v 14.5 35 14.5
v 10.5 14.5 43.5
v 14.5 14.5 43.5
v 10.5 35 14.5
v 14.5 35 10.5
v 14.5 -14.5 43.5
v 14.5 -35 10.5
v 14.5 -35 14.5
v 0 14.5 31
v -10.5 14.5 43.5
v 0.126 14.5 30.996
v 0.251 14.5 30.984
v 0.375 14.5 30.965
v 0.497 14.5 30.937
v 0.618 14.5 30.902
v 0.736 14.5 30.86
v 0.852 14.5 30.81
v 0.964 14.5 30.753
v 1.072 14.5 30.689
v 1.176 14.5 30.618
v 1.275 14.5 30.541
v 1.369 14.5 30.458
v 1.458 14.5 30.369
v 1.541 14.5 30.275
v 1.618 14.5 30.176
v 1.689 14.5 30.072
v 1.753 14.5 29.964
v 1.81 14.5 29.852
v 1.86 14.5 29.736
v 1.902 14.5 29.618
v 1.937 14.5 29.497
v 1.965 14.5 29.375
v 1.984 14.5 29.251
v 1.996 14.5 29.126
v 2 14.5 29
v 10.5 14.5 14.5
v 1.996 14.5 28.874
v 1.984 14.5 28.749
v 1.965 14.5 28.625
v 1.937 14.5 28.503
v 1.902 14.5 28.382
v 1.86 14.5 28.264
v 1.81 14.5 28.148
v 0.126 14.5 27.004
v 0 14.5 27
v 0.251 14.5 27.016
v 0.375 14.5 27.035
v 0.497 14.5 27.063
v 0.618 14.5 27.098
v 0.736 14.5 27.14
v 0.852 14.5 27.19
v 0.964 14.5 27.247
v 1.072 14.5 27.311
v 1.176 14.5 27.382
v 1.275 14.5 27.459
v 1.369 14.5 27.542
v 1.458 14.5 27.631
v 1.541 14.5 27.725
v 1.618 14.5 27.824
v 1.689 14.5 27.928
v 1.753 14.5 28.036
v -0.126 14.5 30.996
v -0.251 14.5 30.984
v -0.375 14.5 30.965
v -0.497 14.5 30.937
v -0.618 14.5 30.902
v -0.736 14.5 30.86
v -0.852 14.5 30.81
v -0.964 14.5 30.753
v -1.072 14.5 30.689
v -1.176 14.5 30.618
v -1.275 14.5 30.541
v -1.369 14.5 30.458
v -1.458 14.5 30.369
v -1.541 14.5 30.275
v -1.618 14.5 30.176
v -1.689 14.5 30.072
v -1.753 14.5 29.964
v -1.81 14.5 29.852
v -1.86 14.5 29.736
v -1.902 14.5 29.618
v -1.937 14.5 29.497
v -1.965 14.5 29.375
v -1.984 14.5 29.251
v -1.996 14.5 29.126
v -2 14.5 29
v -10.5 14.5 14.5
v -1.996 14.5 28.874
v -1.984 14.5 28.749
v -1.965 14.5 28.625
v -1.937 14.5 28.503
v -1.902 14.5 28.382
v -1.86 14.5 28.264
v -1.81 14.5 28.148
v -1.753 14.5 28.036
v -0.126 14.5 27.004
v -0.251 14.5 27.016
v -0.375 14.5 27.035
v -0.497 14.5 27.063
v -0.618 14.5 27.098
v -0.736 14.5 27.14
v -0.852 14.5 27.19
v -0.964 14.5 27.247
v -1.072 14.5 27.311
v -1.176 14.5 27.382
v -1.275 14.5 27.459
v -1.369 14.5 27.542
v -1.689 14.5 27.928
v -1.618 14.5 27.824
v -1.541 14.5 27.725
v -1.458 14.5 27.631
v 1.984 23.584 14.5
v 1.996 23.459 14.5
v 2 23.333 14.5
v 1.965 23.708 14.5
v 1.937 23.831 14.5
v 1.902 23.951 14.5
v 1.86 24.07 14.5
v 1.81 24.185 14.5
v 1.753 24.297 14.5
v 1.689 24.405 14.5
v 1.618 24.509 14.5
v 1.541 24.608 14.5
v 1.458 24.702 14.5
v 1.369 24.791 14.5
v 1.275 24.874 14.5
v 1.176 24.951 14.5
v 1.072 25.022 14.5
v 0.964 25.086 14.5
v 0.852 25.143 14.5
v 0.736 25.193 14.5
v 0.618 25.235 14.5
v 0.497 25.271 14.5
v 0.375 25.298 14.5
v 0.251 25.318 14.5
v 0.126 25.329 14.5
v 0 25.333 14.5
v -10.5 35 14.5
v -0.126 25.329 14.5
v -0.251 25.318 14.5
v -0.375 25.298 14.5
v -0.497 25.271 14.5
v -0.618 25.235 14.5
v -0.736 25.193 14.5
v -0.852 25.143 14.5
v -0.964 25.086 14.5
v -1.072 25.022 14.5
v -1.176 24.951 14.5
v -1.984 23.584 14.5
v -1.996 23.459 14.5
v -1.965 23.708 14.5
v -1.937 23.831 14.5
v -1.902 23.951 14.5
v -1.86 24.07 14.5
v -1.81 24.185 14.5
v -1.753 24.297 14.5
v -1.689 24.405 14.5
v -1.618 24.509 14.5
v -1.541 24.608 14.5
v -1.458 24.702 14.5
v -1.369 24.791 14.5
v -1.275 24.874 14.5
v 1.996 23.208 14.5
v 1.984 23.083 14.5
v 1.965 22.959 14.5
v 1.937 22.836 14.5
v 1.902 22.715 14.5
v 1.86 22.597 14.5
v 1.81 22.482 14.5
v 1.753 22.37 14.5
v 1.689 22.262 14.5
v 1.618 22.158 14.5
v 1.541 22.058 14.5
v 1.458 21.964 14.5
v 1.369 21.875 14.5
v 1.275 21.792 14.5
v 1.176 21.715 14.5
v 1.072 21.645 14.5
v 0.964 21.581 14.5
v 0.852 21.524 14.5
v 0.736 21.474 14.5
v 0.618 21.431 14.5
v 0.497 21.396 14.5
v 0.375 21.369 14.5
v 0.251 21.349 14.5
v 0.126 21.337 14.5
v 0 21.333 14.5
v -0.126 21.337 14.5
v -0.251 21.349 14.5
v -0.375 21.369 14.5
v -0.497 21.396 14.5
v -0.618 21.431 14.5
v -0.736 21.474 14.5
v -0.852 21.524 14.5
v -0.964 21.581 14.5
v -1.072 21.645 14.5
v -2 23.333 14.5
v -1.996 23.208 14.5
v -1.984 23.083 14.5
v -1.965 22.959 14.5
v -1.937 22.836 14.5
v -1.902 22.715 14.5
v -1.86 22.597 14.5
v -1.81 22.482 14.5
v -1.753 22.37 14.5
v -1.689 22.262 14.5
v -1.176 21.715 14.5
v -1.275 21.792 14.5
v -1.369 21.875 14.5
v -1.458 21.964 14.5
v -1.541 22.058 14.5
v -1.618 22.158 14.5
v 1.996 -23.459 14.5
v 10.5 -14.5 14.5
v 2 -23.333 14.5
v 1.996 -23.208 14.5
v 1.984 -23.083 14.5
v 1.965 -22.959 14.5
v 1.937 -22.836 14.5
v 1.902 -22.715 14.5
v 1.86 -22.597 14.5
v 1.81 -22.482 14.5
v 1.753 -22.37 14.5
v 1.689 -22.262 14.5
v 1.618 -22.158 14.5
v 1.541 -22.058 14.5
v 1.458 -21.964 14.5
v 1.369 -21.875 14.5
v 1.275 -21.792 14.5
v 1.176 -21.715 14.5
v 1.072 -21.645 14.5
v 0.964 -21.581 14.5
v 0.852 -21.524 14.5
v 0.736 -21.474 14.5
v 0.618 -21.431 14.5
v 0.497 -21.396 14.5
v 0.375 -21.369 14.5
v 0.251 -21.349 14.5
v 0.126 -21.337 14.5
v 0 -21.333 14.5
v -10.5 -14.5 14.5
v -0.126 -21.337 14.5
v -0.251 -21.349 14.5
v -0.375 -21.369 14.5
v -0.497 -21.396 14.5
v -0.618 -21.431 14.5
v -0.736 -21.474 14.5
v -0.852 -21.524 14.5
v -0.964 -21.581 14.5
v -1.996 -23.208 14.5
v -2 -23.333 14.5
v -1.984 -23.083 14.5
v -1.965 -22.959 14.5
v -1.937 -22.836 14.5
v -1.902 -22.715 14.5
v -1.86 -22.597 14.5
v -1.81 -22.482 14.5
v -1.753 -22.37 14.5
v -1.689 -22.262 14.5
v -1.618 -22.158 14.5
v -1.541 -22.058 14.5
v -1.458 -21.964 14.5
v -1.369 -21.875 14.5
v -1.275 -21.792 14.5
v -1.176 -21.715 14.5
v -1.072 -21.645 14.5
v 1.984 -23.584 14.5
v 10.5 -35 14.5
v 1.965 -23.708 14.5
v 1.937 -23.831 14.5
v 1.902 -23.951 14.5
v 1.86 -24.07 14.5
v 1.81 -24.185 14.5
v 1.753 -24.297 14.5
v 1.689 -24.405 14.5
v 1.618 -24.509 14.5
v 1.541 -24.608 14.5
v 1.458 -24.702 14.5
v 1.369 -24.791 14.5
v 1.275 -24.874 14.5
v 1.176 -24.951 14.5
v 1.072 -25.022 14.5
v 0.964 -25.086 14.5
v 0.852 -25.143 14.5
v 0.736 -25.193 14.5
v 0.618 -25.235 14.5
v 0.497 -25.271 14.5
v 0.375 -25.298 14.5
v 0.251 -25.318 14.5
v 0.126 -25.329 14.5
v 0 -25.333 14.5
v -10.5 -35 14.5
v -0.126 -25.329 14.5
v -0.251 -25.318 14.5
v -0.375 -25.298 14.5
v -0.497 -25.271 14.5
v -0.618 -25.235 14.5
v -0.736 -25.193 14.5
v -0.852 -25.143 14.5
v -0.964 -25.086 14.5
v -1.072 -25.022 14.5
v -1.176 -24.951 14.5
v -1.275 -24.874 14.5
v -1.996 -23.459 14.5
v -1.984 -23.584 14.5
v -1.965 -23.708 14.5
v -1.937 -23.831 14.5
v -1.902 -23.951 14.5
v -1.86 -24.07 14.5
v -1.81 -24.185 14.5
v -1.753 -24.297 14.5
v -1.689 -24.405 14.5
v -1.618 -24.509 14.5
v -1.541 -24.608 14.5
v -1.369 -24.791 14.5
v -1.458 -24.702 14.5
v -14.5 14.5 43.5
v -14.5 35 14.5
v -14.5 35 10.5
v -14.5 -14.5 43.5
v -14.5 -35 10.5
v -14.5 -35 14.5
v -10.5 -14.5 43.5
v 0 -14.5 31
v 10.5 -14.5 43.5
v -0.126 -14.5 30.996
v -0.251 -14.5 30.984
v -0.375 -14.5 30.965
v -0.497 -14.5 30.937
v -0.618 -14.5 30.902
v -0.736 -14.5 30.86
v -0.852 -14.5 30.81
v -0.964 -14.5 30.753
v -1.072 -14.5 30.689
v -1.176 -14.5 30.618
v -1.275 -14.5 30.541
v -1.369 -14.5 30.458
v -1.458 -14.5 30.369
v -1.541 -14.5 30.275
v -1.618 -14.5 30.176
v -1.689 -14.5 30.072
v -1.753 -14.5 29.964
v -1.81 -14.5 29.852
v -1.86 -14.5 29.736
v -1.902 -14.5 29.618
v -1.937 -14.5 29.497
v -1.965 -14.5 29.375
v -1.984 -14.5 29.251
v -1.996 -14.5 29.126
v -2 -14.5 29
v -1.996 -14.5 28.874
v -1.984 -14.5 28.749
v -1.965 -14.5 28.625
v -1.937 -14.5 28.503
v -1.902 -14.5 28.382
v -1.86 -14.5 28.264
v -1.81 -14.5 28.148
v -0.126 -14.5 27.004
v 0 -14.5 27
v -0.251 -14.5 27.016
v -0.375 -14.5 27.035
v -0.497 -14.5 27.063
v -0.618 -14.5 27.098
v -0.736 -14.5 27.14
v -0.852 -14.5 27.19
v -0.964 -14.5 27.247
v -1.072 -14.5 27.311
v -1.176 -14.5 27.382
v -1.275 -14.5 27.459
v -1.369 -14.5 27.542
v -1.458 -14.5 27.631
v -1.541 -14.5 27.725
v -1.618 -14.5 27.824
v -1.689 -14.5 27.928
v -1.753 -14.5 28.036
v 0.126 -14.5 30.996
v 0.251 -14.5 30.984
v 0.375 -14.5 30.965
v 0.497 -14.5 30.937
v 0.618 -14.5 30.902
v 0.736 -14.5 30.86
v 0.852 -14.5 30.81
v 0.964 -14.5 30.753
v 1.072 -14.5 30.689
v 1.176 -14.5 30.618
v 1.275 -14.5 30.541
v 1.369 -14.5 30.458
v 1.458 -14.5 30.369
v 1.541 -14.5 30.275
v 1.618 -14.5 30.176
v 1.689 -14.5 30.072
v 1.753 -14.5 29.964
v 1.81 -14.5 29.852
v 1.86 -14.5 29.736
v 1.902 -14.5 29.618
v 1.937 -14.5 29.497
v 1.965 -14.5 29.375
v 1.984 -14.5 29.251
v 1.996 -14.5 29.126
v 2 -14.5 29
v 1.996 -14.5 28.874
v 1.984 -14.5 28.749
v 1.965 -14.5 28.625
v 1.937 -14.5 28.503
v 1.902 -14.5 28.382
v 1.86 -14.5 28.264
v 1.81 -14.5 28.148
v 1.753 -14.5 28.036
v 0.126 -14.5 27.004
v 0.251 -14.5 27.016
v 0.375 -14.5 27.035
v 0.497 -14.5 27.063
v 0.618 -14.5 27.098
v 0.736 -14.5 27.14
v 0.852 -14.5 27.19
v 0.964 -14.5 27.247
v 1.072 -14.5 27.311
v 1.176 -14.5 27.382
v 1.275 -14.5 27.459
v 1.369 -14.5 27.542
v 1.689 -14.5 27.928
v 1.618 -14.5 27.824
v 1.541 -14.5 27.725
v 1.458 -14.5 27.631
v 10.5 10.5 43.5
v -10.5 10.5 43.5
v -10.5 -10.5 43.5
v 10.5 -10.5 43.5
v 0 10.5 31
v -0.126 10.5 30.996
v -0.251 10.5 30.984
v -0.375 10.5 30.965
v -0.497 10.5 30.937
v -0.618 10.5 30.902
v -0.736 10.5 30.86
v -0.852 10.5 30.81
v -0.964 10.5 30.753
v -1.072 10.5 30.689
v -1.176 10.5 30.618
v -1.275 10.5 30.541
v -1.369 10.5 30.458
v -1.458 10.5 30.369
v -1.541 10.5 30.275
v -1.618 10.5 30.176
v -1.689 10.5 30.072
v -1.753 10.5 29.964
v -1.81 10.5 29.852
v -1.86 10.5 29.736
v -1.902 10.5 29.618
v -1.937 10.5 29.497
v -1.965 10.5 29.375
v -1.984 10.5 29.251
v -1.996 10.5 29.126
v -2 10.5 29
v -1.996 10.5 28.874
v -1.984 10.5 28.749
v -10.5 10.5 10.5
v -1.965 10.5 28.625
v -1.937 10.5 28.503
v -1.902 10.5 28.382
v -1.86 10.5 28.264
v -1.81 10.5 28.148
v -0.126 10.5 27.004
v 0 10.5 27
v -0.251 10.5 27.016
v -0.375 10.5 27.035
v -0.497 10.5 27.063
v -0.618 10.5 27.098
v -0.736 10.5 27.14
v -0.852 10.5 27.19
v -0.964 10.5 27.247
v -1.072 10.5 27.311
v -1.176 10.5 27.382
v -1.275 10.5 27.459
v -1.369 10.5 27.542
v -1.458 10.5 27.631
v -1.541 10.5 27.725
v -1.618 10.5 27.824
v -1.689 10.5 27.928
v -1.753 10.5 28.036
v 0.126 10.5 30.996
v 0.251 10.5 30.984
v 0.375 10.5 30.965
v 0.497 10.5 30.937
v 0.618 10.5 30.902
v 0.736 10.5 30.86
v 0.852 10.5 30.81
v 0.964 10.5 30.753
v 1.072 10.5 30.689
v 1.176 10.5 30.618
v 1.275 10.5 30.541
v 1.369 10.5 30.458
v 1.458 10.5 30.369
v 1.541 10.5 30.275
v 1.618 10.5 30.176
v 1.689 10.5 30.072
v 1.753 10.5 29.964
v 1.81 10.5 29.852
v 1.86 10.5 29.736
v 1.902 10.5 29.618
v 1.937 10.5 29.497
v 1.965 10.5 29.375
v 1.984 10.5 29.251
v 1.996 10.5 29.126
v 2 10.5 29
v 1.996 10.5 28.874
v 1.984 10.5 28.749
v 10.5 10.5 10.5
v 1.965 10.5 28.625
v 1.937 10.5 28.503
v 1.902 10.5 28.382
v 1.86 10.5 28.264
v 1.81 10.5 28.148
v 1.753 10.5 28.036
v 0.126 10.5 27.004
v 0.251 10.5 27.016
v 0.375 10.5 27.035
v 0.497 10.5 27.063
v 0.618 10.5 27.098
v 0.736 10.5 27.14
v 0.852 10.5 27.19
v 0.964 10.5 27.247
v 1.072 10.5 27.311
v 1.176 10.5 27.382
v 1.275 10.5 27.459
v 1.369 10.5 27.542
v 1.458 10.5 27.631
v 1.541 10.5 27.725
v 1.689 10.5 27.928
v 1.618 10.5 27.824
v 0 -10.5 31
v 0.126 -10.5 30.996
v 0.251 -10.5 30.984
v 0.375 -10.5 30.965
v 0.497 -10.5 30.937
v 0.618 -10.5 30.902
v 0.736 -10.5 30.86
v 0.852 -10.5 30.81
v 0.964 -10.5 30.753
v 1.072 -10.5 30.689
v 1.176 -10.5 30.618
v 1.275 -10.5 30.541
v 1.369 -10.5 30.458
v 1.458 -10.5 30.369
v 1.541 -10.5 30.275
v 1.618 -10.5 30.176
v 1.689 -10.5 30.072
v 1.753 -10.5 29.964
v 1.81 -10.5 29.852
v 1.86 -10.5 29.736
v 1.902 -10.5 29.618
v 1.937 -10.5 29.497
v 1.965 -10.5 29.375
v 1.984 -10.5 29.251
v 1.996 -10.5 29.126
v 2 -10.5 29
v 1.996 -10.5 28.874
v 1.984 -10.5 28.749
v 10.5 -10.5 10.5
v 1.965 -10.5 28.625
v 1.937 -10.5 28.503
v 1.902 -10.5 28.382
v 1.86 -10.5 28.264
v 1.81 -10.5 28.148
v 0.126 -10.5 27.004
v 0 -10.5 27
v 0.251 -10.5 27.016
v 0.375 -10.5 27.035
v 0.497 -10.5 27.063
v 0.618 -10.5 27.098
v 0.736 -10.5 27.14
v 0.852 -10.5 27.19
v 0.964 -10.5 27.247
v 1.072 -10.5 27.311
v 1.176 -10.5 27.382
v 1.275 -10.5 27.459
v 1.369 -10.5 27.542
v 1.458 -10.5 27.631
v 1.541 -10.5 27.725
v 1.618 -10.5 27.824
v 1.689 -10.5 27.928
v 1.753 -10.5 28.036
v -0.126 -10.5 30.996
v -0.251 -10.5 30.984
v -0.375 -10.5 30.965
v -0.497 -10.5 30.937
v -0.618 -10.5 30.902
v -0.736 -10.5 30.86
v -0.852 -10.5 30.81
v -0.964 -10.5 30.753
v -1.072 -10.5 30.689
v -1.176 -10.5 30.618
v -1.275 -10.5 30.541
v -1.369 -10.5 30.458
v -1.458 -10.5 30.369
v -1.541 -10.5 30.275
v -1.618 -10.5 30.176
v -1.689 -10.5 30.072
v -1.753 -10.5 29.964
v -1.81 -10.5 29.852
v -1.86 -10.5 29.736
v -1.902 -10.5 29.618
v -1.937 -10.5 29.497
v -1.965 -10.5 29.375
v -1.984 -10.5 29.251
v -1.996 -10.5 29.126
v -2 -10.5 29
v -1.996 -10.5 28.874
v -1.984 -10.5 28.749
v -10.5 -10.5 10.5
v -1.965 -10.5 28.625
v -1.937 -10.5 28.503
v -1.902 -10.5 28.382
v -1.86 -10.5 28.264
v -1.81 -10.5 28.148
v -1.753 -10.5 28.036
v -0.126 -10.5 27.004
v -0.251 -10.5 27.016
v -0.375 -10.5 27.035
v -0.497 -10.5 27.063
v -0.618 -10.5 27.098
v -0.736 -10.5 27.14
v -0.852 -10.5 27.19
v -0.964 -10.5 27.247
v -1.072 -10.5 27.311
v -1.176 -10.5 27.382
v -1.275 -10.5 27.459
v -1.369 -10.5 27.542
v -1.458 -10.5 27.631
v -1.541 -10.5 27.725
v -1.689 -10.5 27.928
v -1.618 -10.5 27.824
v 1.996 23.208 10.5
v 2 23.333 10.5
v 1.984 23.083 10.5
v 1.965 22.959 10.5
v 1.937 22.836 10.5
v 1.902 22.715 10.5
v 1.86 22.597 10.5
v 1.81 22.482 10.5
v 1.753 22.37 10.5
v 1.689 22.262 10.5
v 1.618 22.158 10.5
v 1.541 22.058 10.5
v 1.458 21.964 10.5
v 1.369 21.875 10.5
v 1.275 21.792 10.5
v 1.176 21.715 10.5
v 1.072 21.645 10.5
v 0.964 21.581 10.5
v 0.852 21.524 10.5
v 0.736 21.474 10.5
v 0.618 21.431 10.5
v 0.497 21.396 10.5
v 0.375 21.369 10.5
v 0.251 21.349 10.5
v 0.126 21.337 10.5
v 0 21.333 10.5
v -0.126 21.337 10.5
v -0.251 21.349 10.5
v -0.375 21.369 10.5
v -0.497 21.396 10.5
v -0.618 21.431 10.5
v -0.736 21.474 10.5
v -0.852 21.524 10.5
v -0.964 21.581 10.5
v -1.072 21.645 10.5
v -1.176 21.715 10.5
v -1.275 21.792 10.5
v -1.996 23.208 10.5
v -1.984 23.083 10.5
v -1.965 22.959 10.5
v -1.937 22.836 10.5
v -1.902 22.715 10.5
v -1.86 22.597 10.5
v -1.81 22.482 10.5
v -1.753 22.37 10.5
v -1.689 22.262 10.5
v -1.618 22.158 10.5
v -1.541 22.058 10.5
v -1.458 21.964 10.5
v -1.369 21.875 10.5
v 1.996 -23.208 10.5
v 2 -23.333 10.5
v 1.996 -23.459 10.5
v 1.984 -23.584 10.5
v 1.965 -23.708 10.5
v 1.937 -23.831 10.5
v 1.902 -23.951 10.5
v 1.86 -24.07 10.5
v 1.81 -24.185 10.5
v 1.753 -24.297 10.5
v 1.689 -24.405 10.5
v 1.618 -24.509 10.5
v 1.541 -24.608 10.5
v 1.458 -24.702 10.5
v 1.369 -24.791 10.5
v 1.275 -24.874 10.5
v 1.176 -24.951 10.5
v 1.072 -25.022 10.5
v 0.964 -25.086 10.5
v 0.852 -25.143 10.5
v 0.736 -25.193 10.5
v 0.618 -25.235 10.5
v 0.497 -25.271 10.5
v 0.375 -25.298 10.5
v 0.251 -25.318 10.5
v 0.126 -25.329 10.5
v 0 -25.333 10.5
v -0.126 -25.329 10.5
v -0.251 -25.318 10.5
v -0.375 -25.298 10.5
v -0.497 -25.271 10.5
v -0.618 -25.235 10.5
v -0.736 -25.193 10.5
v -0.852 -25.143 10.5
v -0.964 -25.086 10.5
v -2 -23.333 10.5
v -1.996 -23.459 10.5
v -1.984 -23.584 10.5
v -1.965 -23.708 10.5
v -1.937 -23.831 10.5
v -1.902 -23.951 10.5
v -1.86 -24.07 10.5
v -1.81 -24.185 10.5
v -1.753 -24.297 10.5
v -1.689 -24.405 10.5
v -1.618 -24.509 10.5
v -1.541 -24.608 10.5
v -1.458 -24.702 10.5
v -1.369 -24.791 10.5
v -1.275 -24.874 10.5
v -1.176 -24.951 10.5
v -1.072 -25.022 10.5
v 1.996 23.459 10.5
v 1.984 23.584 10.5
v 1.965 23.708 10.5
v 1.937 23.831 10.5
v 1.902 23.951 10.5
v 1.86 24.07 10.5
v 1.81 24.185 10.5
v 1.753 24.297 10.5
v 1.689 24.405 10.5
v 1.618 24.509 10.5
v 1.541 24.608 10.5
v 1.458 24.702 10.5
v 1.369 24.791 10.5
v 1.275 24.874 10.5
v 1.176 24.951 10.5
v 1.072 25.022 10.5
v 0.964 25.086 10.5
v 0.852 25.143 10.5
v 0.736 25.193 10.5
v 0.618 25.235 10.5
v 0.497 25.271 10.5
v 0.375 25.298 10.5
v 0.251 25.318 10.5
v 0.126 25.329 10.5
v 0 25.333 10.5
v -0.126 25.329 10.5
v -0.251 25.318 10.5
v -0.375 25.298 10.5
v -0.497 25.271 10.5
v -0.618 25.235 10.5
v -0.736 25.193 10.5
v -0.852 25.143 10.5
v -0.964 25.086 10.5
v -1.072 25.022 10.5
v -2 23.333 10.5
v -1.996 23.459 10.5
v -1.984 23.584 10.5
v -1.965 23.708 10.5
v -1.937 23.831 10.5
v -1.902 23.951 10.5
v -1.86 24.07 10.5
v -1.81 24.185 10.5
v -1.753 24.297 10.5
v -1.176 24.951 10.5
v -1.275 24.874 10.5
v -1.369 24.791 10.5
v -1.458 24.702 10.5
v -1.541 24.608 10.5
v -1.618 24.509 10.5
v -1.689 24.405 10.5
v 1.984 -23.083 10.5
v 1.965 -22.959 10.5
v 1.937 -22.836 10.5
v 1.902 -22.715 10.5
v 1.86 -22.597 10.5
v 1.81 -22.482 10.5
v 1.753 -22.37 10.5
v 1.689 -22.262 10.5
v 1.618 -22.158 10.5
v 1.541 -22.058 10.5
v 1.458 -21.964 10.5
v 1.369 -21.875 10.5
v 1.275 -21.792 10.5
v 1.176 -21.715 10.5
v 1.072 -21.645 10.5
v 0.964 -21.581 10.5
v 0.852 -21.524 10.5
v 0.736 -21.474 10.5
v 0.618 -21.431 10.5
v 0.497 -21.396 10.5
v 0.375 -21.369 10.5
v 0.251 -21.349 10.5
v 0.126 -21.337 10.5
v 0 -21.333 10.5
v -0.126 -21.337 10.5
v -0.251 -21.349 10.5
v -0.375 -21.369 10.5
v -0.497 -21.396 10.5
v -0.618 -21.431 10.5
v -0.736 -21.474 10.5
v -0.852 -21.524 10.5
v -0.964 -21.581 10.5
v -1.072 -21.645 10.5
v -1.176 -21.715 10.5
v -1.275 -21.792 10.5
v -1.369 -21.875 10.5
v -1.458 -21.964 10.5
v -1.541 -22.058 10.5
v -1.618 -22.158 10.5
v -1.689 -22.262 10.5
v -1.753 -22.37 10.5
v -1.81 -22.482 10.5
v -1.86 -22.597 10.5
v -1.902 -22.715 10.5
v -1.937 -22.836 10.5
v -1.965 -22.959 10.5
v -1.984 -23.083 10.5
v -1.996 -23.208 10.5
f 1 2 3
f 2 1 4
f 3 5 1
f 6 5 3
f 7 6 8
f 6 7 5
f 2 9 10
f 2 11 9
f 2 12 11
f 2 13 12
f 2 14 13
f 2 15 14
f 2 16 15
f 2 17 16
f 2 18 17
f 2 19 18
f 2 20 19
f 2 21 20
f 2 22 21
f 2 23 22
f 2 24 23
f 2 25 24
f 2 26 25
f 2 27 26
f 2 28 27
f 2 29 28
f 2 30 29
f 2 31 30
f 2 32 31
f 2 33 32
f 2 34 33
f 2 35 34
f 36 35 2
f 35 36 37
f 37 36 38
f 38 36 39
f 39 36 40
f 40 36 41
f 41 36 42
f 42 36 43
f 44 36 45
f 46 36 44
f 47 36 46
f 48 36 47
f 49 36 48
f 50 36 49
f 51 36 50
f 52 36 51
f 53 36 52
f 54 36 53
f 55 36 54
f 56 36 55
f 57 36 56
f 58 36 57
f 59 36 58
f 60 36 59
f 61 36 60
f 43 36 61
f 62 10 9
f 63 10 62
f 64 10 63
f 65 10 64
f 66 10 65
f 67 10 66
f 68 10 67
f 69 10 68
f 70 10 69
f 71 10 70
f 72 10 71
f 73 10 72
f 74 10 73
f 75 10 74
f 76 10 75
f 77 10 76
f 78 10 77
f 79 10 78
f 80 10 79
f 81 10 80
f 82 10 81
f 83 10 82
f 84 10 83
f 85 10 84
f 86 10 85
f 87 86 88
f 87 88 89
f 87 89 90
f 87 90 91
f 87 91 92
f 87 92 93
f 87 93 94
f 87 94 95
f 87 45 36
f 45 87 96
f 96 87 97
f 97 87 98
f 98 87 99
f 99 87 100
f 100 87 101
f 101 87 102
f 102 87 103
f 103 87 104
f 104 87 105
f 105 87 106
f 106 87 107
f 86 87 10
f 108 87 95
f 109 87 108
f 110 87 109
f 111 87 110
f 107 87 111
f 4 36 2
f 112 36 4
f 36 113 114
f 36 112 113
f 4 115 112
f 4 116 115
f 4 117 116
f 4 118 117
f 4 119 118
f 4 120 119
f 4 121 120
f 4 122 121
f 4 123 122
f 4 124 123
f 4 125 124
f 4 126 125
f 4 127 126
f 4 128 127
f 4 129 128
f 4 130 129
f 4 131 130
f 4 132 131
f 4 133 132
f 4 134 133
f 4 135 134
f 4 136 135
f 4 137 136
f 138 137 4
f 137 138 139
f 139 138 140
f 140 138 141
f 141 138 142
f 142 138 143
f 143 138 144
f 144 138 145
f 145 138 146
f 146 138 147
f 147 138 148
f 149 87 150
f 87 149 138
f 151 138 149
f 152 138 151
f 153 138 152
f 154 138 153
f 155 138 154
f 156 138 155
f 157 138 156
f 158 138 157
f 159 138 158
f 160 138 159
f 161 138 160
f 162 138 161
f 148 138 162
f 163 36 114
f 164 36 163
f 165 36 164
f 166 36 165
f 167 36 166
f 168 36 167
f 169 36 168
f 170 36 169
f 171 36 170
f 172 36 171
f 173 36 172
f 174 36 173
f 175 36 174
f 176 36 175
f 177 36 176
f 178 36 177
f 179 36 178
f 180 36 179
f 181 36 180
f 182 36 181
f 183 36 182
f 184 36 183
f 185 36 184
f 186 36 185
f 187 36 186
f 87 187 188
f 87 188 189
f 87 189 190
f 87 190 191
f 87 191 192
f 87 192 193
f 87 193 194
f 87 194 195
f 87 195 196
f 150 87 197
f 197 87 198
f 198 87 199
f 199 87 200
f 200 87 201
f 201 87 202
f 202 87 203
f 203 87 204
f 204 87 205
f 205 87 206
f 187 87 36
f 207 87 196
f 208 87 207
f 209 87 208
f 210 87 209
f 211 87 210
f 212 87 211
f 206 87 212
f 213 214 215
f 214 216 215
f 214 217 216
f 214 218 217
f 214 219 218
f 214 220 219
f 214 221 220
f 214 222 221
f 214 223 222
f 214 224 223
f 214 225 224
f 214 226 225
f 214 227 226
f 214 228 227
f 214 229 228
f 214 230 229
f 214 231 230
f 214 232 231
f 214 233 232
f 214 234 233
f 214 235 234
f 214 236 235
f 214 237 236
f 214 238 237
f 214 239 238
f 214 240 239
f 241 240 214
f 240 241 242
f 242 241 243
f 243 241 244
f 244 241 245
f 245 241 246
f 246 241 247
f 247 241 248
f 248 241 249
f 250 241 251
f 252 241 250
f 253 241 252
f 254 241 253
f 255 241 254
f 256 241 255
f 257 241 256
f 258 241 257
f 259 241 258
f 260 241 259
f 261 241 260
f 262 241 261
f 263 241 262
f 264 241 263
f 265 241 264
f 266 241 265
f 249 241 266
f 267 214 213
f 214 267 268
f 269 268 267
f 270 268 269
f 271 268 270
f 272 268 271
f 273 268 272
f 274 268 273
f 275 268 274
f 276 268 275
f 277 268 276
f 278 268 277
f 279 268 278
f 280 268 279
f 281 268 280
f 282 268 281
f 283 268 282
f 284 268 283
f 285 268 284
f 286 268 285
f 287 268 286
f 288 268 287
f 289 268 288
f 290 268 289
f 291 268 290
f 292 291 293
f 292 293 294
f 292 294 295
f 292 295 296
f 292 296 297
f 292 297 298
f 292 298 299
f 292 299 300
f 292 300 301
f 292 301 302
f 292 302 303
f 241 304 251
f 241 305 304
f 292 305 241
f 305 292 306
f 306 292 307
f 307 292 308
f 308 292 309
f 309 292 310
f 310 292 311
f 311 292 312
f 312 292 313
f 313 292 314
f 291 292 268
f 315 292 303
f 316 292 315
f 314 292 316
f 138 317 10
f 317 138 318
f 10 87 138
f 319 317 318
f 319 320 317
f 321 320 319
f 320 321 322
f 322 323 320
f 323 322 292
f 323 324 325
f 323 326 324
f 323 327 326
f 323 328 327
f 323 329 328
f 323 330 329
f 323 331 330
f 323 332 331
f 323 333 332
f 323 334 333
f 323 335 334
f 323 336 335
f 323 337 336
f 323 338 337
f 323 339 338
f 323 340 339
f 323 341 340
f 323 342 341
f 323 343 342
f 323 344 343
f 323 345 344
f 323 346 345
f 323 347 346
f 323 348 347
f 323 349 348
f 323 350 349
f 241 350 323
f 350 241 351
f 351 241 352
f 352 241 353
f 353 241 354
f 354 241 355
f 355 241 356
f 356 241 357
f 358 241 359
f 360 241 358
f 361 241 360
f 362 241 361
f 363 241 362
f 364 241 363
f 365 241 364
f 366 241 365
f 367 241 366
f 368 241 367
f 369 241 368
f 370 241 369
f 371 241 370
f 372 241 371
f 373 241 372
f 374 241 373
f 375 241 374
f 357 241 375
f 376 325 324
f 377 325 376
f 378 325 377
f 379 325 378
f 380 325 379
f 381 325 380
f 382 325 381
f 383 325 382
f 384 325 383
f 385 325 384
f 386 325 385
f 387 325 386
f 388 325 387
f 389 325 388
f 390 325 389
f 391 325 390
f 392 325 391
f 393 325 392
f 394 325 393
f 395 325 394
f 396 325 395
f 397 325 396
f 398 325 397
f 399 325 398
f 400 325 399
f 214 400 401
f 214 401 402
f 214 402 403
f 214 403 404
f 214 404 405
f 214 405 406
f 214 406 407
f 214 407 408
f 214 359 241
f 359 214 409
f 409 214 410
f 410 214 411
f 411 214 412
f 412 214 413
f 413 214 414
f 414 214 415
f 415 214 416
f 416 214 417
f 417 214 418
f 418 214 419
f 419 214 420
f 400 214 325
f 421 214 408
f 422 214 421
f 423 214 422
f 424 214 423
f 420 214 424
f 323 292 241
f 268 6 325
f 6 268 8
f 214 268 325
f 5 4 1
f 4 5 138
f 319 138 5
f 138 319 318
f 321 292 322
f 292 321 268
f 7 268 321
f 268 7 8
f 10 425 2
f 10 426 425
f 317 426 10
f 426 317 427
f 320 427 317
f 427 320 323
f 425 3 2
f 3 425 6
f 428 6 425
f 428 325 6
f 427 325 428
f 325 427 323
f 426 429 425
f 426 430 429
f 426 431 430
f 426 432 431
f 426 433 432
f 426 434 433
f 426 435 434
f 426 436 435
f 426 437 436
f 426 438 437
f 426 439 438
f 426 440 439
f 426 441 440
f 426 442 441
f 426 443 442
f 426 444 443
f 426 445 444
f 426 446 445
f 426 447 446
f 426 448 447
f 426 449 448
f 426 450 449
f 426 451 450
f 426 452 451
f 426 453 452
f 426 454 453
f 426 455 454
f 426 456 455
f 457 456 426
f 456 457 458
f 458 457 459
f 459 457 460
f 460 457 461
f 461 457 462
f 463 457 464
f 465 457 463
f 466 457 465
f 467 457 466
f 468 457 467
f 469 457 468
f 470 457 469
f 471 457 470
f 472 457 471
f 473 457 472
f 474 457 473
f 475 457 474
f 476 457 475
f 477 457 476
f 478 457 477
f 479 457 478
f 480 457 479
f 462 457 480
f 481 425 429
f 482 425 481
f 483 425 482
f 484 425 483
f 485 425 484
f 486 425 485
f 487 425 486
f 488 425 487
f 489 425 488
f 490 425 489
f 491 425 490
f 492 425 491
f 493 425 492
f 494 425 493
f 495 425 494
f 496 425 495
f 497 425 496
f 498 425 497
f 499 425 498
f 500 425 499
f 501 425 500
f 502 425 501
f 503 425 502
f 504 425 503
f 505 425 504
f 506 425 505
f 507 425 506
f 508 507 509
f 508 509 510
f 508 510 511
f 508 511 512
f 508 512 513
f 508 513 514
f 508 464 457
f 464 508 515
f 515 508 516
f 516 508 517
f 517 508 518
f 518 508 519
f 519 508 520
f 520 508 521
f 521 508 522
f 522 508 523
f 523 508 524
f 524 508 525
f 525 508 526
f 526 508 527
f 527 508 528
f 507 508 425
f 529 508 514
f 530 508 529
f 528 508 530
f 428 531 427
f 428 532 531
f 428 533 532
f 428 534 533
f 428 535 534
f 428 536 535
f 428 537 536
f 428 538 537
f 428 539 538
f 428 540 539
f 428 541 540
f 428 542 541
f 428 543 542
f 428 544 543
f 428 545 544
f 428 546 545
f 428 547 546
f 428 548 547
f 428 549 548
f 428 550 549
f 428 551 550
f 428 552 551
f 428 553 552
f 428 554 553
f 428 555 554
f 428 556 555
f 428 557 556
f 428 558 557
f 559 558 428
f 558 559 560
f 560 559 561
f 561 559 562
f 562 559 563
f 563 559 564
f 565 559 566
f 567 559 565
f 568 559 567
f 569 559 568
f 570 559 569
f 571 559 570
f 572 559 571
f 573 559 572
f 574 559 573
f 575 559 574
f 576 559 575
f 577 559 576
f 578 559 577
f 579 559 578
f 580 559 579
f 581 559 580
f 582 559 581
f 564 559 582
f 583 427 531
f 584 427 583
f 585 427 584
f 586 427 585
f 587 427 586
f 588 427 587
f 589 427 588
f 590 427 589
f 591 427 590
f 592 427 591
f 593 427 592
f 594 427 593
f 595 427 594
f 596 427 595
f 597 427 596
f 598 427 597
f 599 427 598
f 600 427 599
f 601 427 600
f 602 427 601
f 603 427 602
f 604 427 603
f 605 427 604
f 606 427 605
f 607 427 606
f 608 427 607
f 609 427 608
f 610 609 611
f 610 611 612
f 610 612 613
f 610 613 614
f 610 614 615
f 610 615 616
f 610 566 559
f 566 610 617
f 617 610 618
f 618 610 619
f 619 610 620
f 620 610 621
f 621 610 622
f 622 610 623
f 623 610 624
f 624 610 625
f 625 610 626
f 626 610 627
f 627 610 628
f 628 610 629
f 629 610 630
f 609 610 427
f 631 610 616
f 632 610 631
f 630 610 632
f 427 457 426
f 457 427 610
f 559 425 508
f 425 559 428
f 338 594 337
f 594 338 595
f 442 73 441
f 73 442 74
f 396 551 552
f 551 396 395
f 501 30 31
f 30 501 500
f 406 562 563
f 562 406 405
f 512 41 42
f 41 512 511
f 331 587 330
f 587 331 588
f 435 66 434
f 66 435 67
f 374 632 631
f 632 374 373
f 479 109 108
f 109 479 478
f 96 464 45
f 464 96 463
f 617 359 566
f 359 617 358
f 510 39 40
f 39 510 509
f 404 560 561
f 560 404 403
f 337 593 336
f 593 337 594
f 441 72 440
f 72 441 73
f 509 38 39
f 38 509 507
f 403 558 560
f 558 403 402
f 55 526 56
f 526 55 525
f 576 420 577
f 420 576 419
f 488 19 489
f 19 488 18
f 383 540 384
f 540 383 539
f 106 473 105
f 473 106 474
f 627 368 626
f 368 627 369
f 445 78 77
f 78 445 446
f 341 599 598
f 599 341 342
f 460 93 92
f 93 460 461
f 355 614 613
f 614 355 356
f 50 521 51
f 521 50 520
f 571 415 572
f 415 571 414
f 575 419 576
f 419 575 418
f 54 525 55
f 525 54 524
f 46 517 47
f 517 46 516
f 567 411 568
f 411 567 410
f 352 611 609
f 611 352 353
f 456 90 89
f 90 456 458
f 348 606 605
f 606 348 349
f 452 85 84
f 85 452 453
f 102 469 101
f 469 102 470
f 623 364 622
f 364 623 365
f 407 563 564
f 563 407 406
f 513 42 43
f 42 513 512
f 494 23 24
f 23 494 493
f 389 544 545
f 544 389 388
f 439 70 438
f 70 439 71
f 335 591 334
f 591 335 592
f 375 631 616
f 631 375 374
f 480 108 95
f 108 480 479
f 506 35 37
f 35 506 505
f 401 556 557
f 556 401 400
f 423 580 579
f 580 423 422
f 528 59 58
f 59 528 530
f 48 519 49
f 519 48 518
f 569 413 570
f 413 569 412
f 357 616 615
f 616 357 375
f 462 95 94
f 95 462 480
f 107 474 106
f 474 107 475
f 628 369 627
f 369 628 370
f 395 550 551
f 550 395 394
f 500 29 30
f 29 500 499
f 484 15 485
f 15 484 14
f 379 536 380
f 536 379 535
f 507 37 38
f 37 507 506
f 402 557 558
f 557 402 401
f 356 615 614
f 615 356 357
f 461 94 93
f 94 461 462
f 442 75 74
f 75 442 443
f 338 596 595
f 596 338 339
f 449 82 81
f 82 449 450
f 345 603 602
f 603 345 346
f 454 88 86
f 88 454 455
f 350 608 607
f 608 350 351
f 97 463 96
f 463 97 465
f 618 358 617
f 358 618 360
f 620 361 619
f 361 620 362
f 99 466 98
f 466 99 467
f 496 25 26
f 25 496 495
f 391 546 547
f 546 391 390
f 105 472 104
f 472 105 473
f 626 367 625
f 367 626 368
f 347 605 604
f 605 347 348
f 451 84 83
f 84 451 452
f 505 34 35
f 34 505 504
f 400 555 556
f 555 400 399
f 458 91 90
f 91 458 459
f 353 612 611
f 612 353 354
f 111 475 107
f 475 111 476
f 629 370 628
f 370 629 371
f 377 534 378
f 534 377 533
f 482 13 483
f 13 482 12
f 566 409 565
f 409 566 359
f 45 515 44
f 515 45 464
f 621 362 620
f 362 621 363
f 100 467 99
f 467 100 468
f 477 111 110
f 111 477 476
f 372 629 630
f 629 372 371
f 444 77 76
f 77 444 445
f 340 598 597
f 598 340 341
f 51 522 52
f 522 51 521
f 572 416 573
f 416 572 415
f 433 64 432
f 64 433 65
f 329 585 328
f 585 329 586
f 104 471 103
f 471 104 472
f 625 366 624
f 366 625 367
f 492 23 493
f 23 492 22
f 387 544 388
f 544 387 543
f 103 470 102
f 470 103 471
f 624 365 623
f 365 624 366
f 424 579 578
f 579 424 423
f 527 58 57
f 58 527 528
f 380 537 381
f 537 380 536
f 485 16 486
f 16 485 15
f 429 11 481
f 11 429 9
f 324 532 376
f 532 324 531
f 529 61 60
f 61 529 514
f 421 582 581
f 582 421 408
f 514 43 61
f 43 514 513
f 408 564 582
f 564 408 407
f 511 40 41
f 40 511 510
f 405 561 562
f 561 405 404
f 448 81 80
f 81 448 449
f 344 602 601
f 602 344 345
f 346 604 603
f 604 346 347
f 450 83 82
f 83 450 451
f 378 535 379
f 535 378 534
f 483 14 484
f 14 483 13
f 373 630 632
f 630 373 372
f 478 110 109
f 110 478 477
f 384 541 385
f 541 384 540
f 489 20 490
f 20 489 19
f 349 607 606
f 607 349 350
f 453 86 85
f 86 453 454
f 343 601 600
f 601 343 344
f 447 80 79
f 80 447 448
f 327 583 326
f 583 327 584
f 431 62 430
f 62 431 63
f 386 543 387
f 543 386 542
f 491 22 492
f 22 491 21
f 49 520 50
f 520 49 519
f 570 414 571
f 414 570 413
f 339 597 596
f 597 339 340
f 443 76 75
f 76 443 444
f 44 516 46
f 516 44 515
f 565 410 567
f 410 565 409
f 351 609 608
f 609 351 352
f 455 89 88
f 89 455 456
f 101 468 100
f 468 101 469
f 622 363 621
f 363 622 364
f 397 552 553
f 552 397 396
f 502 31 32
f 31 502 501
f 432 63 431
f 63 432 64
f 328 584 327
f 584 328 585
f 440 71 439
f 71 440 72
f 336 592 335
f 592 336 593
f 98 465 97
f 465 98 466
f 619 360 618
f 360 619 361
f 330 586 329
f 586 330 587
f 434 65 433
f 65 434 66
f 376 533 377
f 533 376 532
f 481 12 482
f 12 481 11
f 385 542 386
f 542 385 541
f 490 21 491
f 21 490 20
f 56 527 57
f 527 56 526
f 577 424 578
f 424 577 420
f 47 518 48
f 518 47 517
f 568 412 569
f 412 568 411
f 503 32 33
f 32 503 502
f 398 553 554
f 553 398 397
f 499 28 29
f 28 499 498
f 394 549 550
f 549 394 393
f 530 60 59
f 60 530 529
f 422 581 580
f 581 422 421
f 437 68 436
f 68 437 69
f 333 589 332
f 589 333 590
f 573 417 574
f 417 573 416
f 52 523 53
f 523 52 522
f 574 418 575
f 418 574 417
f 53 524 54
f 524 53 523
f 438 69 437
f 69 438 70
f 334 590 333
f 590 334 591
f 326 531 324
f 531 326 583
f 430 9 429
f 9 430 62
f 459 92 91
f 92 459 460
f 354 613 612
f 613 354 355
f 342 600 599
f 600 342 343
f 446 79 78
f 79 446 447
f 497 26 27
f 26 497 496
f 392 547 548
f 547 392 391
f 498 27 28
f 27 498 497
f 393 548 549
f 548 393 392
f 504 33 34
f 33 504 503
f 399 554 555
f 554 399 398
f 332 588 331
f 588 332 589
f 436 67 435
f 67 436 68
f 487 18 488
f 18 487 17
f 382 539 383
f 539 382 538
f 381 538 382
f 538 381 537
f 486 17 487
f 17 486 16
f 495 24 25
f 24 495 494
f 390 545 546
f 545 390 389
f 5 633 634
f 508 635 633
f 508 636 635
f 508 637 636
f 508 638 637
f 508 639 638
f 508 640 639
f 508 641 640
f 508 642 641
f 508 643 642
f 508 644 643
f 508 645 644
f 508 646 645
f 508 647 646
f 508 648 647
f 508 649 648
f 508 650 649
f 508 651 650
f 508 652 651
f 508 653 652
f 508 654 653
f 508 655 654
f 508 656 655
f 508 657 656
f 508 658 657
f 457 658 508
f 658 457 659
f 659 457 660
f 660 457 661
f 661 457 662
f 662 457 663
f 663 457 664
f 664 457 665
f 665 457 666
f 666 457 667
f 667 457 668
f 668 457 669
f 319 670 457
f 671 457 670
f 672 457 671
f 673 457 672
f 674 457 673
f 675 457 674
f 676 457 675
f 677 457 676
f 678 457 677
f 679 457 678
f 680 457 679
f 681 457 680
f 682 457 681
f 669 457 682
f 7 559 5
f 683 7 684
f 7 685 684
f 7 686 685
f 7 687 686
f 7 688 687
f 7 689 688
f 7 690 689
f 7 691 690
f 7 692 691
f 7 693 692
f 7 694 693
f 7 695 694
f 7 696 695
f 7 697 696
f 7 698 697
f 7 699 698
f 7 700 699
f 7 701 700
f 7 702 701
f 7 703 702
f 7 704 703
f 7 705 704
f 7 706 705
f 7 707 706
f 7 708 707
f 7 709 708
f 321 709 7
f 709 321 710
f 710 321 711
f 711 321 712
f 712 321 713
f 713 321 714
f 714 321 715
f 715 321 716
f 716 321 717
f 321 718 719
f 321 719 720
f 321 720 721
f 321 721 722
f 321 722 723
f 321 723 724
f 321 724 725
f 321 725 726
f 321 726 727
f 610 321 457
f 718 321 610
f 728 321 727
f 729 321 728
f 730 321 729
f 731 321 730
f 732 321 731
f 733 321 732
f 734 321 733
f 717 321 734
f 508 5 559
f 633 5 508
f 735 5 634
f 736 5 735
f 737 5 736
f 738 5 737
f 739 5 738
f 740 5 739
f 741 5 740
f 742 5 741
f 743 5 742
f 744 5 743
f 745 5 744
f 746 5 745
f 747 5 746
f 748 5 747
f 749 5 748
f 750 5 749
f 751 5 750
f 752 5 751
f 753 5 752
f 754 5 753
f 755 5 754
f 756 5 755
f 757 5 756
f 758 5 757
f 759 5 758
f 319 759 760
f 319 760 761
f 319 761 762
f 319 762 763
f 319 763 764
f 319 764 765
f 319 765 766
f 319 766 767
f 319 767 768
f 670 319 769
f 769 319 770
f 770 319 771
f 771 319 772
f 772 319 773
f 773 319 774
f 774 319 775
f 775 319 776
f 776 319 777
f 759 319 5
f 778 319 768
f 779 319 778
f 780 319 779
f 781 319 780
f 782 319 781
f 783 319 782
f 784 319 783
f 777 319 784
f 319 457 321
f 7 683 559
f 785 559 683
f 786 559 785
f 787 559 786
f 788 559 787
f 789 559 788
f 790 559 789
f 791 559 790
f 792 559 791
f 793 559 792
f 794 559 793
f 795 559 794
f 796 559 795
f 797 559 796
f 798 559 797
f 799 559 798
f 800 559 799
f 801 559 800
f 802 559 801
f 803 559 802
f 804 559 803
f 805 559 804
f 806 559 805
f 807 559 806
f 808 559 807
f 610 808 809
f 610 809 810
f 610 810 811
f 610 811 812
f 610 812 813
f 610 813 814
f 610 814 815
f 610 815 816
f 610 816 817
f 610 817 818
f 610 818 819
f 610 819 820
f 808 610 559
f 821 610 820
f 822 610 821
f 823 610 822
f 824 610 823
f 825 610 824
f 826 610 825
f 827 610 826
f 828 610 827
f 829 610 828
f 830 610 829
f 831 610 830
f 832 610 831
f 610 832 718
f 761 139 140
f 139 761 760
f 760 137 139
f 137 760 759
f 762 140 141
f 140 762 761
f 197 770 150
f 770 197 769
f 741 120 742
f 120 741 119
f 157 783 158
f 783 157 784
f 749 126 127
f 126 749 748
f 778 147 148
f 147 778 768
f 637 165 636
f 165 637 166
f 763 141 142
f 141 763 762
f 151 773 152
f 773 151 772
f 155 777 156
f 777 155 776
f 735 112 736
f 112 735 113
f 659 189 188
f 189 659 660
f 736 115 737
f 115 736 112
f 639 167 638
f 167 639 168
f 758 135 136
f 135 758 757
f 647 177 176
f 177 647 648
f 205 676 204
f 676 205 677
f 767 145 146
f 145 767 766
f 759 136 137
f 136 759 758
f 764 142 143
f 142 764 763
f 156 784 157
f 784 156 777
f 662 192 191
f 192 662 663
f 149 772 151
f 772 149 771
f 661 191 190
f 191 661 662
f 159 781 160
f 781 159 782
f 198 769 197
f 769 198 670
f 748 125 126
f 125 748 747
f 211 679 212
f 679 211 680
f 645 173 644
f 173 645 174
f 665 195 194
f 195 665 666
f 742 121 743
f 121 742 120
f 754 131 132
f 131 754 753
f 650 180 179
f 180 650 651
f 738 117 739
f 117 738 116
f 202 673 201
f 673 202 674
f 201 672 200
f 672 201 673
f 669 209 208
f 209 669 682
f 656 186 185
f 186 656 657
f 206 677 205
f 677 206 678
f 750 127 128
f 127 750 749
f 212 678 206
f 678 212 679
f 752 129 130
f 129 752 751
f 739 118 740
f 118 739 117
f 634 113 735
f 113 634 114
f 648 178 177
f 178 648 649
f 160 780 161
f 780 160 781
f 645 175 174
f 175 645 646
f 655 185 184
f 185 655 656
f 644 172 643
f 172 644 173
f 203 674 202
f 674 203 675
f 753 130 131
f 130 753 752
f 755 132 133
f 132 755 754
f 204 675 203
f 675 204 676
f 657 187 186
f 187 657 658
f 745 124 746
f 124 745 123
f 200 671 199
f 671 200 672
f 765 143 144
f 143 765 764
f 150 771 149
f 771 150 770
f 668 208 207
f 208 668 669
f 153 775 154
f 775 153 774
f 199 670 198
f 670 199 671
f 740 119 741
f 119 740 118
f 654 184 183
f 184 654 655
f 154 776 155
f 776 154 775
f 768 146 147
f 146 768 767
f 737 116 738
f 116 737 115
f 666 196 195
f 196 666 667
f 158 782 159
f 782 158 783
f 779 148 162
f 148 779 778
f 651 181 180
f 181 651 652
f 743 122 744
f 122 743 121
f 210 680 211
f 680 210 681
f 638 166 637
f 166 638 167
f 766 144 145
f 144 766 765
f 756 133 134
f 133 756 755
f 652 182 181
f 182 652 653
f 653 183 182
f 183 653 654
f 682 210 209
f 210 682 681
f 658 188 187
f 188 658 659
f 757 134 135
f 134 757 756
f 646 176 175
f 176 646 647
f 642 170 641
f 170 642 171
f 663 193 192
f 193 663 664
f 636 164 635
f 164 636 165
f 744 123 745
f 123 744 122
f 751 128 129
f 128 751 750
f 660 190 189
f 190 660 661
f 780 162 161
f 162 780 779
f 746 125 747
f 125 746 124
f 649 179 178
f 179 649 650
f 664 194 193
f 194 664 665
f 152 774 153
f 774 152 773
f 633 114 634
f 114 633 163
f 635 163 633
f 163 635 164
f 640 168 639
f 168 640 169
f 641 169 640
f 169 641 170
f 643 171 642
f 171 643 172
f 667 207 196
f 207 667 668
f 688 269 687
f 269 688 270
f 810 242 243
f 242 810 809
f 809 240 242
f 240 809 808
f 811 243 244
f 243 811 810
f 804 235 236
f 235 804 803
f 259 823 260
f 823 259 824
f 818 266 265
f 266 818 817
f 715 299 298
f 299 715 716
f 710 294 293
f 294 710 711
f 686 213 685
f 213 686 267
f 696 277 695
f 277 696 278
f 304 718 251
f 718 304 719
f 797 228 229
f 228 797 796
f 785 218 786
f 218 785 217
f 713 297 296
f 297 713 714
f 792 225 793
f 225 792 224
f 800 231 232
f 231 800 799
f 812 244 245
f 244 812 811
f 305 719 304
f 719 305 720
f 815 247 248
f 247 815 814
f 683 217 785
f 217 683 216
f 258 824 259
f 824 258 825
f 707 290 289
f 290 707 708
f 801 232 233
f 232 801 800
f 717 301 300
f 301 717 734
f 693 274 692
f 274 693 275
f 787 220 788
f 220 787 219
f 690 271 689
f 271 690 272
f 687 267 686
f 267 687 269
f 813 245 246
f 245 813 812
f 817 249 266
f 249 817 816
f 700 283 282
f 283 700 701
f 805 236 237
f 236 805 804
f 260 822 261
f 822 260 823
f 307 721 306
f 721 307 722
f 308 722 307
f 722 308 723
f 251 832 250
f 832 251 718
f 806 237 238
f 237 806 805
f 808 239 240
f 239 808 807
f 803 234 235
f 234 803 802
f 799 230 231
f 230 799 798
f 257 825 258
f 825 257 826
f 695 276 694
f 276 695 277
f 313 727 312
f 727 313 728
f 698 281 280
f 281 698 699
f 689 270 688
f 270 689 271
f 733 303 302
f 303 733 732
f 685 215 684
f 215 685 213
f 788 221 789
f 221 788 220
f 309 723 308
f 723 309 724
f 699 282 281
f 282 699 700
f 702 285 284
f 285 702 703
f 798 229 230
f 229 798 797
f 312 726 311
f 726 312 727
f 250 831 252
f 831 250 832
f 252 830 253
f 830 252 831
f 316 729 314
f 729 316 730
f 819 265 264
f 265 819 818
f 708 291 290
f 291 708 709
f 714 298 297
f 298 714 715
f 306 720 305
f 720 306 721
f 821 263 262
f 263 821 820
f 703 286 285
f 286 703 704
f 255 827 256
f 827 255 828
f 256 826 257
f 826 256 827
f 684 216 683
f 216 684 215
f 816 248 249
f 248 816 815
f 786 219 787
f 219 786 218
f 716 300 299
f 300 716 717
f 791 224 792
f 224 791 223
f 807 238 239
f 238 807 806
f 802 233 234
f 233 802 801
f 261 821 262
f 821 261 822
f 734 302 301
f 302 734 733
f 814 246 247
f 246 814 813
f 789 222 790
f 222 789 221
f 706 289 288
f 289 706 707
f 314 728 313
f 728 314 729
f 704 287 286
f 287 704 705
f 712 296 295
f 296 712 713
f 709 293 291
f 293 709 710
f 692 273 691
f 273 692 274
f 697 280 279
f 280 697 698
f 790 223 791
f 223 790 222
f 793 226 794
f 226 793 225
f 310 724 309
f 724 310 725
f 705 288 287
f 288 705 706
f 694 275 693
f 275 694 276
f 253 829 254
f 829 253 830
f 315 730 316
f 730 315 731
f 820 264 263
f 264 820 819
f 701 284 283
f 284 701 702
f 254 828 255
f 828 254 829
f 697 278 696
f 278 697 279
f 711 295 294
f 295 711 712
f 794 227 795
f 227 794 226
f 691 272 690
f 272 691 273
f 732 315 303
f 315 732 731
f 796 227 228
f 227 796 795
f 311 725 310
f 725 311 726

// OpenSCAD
longueur 		= 70;
epaisseur		= 4;
profile 		= 21;
fn				= 100;
taille_cadre 	= profile + (2 * epaisseur);
diam_axe_roues 	= 4;
diam_trou_vis 	= 4;

//boolean
3_hole_type 	= 1;
has_renfort 	= 1;

rotate(a=[0, 0, 90]){
	difference() {
		union(){
			//Base du té
			cube(size = [longueur, taille_cadre, taille_cadre], center = true, $fn = fn);
			translate([0, 0, taille_cadre]) {
				//Base
				cube(size = [taille_cadre, taille_cadre, taille_cadre], center = true, $fn = fn);
			}

			if(has_renfort == 1) {
				for(r = [0, 180]) {
					rotate([0, 0, r]) {
						for(y = [- (profile + epaisseur)/ 2, (profile + epaisseur)/ 2]) {
							translate([0, y, 0]) {
								polyhedron(points = [ 	[ longueur / 2, - epaisseur / 2, profile / 2 + epaisseur],
														[ longueur / 2,   epaisseur / 2, profile / 2 + epaisseur],
														[ taille_cadre / 2, - epaisseur / 2, profile / 2 + epaisseur],
														[ taille_cadre / 2,   epaisseur / 2, profile / 2 + epaisseur],
														[ taille_cadre / 2, - epaisseur / 2, profile / 2 + epaisseur + taille_cadre],
														[ taille_cadre / 2,   epaisseur / 2, profile / 2 + epaisseur + taille_cadre]
													],
											faces = [	[0, 4, 5, 1],
														[0, 1, 3, 2],
														[4, 2, 3, 5],
														[1, 5, 3],
														[0, 2, 4]
													]
											);
							}
						}	
					}
				}
			}
		}
		

		//Excavation pour le profilé
		translate([0, 0, -(epaisseur / 2) - 1 ]) {
			cube(size = [longueur + 2, profile + 2 * epaisseur + 0.2 , profile + epaisseur + 2], center = true, $fn = fn);
		}
		

		if(3_hole_type == 1)
		{
			//Trou axe roues
			for(i = [-1 ,1]) {
				translate([i * longueur / 3, taille_cadre / 2 + 1, 0]) {
					rotate(a=[90, 0, 0]) {
						cylinder(h = taille_cadre + 2, d = diam_axe_roues, $fn = fn);
					}
				}
			}
		}

		//Trou axe roues
		translate([0, taille_cadre / 2 + 1, 0]) {
			rotate(a=[90, 0, 0]) {
				cylinder(h = taille_cadre + 2, d = diam_axe_roues, $fn = fn);
			}
		}

		//trou T-nut 1
		translate([longueur / 3, 0, 0]) {
			rotate(a=[0, 0, 0]) {
				cylinder(h = taille_cadre, d = diam_trou_vis , $fn = fn);
			}
		}
		//Trou T-nut 2
		translate([-(longueur / 3), 0, 0]) {
			rotate(a=[0, 0, 0]) {
				cylinder(h = taille_cadre, d = diam_trou_vis , $fn = fn);
			}
		}

	//Bite du T
		translate([0, 0, taille_cadre]) {				
			//Excavation
			cube(size = [profile, profile, taille_cadre + epaisseur + 5], center = true, $fn = fn);

			//trou T-nut
			translate([-(taille_cadre / 2) - 1, 0, 0]) {
				rotate(a=[0, 90, 0]) {
					cylinder(h = taille_cadre + 2, d = diam_trou_vis , $fn = fn);
				}
			}
		}
	}

}
